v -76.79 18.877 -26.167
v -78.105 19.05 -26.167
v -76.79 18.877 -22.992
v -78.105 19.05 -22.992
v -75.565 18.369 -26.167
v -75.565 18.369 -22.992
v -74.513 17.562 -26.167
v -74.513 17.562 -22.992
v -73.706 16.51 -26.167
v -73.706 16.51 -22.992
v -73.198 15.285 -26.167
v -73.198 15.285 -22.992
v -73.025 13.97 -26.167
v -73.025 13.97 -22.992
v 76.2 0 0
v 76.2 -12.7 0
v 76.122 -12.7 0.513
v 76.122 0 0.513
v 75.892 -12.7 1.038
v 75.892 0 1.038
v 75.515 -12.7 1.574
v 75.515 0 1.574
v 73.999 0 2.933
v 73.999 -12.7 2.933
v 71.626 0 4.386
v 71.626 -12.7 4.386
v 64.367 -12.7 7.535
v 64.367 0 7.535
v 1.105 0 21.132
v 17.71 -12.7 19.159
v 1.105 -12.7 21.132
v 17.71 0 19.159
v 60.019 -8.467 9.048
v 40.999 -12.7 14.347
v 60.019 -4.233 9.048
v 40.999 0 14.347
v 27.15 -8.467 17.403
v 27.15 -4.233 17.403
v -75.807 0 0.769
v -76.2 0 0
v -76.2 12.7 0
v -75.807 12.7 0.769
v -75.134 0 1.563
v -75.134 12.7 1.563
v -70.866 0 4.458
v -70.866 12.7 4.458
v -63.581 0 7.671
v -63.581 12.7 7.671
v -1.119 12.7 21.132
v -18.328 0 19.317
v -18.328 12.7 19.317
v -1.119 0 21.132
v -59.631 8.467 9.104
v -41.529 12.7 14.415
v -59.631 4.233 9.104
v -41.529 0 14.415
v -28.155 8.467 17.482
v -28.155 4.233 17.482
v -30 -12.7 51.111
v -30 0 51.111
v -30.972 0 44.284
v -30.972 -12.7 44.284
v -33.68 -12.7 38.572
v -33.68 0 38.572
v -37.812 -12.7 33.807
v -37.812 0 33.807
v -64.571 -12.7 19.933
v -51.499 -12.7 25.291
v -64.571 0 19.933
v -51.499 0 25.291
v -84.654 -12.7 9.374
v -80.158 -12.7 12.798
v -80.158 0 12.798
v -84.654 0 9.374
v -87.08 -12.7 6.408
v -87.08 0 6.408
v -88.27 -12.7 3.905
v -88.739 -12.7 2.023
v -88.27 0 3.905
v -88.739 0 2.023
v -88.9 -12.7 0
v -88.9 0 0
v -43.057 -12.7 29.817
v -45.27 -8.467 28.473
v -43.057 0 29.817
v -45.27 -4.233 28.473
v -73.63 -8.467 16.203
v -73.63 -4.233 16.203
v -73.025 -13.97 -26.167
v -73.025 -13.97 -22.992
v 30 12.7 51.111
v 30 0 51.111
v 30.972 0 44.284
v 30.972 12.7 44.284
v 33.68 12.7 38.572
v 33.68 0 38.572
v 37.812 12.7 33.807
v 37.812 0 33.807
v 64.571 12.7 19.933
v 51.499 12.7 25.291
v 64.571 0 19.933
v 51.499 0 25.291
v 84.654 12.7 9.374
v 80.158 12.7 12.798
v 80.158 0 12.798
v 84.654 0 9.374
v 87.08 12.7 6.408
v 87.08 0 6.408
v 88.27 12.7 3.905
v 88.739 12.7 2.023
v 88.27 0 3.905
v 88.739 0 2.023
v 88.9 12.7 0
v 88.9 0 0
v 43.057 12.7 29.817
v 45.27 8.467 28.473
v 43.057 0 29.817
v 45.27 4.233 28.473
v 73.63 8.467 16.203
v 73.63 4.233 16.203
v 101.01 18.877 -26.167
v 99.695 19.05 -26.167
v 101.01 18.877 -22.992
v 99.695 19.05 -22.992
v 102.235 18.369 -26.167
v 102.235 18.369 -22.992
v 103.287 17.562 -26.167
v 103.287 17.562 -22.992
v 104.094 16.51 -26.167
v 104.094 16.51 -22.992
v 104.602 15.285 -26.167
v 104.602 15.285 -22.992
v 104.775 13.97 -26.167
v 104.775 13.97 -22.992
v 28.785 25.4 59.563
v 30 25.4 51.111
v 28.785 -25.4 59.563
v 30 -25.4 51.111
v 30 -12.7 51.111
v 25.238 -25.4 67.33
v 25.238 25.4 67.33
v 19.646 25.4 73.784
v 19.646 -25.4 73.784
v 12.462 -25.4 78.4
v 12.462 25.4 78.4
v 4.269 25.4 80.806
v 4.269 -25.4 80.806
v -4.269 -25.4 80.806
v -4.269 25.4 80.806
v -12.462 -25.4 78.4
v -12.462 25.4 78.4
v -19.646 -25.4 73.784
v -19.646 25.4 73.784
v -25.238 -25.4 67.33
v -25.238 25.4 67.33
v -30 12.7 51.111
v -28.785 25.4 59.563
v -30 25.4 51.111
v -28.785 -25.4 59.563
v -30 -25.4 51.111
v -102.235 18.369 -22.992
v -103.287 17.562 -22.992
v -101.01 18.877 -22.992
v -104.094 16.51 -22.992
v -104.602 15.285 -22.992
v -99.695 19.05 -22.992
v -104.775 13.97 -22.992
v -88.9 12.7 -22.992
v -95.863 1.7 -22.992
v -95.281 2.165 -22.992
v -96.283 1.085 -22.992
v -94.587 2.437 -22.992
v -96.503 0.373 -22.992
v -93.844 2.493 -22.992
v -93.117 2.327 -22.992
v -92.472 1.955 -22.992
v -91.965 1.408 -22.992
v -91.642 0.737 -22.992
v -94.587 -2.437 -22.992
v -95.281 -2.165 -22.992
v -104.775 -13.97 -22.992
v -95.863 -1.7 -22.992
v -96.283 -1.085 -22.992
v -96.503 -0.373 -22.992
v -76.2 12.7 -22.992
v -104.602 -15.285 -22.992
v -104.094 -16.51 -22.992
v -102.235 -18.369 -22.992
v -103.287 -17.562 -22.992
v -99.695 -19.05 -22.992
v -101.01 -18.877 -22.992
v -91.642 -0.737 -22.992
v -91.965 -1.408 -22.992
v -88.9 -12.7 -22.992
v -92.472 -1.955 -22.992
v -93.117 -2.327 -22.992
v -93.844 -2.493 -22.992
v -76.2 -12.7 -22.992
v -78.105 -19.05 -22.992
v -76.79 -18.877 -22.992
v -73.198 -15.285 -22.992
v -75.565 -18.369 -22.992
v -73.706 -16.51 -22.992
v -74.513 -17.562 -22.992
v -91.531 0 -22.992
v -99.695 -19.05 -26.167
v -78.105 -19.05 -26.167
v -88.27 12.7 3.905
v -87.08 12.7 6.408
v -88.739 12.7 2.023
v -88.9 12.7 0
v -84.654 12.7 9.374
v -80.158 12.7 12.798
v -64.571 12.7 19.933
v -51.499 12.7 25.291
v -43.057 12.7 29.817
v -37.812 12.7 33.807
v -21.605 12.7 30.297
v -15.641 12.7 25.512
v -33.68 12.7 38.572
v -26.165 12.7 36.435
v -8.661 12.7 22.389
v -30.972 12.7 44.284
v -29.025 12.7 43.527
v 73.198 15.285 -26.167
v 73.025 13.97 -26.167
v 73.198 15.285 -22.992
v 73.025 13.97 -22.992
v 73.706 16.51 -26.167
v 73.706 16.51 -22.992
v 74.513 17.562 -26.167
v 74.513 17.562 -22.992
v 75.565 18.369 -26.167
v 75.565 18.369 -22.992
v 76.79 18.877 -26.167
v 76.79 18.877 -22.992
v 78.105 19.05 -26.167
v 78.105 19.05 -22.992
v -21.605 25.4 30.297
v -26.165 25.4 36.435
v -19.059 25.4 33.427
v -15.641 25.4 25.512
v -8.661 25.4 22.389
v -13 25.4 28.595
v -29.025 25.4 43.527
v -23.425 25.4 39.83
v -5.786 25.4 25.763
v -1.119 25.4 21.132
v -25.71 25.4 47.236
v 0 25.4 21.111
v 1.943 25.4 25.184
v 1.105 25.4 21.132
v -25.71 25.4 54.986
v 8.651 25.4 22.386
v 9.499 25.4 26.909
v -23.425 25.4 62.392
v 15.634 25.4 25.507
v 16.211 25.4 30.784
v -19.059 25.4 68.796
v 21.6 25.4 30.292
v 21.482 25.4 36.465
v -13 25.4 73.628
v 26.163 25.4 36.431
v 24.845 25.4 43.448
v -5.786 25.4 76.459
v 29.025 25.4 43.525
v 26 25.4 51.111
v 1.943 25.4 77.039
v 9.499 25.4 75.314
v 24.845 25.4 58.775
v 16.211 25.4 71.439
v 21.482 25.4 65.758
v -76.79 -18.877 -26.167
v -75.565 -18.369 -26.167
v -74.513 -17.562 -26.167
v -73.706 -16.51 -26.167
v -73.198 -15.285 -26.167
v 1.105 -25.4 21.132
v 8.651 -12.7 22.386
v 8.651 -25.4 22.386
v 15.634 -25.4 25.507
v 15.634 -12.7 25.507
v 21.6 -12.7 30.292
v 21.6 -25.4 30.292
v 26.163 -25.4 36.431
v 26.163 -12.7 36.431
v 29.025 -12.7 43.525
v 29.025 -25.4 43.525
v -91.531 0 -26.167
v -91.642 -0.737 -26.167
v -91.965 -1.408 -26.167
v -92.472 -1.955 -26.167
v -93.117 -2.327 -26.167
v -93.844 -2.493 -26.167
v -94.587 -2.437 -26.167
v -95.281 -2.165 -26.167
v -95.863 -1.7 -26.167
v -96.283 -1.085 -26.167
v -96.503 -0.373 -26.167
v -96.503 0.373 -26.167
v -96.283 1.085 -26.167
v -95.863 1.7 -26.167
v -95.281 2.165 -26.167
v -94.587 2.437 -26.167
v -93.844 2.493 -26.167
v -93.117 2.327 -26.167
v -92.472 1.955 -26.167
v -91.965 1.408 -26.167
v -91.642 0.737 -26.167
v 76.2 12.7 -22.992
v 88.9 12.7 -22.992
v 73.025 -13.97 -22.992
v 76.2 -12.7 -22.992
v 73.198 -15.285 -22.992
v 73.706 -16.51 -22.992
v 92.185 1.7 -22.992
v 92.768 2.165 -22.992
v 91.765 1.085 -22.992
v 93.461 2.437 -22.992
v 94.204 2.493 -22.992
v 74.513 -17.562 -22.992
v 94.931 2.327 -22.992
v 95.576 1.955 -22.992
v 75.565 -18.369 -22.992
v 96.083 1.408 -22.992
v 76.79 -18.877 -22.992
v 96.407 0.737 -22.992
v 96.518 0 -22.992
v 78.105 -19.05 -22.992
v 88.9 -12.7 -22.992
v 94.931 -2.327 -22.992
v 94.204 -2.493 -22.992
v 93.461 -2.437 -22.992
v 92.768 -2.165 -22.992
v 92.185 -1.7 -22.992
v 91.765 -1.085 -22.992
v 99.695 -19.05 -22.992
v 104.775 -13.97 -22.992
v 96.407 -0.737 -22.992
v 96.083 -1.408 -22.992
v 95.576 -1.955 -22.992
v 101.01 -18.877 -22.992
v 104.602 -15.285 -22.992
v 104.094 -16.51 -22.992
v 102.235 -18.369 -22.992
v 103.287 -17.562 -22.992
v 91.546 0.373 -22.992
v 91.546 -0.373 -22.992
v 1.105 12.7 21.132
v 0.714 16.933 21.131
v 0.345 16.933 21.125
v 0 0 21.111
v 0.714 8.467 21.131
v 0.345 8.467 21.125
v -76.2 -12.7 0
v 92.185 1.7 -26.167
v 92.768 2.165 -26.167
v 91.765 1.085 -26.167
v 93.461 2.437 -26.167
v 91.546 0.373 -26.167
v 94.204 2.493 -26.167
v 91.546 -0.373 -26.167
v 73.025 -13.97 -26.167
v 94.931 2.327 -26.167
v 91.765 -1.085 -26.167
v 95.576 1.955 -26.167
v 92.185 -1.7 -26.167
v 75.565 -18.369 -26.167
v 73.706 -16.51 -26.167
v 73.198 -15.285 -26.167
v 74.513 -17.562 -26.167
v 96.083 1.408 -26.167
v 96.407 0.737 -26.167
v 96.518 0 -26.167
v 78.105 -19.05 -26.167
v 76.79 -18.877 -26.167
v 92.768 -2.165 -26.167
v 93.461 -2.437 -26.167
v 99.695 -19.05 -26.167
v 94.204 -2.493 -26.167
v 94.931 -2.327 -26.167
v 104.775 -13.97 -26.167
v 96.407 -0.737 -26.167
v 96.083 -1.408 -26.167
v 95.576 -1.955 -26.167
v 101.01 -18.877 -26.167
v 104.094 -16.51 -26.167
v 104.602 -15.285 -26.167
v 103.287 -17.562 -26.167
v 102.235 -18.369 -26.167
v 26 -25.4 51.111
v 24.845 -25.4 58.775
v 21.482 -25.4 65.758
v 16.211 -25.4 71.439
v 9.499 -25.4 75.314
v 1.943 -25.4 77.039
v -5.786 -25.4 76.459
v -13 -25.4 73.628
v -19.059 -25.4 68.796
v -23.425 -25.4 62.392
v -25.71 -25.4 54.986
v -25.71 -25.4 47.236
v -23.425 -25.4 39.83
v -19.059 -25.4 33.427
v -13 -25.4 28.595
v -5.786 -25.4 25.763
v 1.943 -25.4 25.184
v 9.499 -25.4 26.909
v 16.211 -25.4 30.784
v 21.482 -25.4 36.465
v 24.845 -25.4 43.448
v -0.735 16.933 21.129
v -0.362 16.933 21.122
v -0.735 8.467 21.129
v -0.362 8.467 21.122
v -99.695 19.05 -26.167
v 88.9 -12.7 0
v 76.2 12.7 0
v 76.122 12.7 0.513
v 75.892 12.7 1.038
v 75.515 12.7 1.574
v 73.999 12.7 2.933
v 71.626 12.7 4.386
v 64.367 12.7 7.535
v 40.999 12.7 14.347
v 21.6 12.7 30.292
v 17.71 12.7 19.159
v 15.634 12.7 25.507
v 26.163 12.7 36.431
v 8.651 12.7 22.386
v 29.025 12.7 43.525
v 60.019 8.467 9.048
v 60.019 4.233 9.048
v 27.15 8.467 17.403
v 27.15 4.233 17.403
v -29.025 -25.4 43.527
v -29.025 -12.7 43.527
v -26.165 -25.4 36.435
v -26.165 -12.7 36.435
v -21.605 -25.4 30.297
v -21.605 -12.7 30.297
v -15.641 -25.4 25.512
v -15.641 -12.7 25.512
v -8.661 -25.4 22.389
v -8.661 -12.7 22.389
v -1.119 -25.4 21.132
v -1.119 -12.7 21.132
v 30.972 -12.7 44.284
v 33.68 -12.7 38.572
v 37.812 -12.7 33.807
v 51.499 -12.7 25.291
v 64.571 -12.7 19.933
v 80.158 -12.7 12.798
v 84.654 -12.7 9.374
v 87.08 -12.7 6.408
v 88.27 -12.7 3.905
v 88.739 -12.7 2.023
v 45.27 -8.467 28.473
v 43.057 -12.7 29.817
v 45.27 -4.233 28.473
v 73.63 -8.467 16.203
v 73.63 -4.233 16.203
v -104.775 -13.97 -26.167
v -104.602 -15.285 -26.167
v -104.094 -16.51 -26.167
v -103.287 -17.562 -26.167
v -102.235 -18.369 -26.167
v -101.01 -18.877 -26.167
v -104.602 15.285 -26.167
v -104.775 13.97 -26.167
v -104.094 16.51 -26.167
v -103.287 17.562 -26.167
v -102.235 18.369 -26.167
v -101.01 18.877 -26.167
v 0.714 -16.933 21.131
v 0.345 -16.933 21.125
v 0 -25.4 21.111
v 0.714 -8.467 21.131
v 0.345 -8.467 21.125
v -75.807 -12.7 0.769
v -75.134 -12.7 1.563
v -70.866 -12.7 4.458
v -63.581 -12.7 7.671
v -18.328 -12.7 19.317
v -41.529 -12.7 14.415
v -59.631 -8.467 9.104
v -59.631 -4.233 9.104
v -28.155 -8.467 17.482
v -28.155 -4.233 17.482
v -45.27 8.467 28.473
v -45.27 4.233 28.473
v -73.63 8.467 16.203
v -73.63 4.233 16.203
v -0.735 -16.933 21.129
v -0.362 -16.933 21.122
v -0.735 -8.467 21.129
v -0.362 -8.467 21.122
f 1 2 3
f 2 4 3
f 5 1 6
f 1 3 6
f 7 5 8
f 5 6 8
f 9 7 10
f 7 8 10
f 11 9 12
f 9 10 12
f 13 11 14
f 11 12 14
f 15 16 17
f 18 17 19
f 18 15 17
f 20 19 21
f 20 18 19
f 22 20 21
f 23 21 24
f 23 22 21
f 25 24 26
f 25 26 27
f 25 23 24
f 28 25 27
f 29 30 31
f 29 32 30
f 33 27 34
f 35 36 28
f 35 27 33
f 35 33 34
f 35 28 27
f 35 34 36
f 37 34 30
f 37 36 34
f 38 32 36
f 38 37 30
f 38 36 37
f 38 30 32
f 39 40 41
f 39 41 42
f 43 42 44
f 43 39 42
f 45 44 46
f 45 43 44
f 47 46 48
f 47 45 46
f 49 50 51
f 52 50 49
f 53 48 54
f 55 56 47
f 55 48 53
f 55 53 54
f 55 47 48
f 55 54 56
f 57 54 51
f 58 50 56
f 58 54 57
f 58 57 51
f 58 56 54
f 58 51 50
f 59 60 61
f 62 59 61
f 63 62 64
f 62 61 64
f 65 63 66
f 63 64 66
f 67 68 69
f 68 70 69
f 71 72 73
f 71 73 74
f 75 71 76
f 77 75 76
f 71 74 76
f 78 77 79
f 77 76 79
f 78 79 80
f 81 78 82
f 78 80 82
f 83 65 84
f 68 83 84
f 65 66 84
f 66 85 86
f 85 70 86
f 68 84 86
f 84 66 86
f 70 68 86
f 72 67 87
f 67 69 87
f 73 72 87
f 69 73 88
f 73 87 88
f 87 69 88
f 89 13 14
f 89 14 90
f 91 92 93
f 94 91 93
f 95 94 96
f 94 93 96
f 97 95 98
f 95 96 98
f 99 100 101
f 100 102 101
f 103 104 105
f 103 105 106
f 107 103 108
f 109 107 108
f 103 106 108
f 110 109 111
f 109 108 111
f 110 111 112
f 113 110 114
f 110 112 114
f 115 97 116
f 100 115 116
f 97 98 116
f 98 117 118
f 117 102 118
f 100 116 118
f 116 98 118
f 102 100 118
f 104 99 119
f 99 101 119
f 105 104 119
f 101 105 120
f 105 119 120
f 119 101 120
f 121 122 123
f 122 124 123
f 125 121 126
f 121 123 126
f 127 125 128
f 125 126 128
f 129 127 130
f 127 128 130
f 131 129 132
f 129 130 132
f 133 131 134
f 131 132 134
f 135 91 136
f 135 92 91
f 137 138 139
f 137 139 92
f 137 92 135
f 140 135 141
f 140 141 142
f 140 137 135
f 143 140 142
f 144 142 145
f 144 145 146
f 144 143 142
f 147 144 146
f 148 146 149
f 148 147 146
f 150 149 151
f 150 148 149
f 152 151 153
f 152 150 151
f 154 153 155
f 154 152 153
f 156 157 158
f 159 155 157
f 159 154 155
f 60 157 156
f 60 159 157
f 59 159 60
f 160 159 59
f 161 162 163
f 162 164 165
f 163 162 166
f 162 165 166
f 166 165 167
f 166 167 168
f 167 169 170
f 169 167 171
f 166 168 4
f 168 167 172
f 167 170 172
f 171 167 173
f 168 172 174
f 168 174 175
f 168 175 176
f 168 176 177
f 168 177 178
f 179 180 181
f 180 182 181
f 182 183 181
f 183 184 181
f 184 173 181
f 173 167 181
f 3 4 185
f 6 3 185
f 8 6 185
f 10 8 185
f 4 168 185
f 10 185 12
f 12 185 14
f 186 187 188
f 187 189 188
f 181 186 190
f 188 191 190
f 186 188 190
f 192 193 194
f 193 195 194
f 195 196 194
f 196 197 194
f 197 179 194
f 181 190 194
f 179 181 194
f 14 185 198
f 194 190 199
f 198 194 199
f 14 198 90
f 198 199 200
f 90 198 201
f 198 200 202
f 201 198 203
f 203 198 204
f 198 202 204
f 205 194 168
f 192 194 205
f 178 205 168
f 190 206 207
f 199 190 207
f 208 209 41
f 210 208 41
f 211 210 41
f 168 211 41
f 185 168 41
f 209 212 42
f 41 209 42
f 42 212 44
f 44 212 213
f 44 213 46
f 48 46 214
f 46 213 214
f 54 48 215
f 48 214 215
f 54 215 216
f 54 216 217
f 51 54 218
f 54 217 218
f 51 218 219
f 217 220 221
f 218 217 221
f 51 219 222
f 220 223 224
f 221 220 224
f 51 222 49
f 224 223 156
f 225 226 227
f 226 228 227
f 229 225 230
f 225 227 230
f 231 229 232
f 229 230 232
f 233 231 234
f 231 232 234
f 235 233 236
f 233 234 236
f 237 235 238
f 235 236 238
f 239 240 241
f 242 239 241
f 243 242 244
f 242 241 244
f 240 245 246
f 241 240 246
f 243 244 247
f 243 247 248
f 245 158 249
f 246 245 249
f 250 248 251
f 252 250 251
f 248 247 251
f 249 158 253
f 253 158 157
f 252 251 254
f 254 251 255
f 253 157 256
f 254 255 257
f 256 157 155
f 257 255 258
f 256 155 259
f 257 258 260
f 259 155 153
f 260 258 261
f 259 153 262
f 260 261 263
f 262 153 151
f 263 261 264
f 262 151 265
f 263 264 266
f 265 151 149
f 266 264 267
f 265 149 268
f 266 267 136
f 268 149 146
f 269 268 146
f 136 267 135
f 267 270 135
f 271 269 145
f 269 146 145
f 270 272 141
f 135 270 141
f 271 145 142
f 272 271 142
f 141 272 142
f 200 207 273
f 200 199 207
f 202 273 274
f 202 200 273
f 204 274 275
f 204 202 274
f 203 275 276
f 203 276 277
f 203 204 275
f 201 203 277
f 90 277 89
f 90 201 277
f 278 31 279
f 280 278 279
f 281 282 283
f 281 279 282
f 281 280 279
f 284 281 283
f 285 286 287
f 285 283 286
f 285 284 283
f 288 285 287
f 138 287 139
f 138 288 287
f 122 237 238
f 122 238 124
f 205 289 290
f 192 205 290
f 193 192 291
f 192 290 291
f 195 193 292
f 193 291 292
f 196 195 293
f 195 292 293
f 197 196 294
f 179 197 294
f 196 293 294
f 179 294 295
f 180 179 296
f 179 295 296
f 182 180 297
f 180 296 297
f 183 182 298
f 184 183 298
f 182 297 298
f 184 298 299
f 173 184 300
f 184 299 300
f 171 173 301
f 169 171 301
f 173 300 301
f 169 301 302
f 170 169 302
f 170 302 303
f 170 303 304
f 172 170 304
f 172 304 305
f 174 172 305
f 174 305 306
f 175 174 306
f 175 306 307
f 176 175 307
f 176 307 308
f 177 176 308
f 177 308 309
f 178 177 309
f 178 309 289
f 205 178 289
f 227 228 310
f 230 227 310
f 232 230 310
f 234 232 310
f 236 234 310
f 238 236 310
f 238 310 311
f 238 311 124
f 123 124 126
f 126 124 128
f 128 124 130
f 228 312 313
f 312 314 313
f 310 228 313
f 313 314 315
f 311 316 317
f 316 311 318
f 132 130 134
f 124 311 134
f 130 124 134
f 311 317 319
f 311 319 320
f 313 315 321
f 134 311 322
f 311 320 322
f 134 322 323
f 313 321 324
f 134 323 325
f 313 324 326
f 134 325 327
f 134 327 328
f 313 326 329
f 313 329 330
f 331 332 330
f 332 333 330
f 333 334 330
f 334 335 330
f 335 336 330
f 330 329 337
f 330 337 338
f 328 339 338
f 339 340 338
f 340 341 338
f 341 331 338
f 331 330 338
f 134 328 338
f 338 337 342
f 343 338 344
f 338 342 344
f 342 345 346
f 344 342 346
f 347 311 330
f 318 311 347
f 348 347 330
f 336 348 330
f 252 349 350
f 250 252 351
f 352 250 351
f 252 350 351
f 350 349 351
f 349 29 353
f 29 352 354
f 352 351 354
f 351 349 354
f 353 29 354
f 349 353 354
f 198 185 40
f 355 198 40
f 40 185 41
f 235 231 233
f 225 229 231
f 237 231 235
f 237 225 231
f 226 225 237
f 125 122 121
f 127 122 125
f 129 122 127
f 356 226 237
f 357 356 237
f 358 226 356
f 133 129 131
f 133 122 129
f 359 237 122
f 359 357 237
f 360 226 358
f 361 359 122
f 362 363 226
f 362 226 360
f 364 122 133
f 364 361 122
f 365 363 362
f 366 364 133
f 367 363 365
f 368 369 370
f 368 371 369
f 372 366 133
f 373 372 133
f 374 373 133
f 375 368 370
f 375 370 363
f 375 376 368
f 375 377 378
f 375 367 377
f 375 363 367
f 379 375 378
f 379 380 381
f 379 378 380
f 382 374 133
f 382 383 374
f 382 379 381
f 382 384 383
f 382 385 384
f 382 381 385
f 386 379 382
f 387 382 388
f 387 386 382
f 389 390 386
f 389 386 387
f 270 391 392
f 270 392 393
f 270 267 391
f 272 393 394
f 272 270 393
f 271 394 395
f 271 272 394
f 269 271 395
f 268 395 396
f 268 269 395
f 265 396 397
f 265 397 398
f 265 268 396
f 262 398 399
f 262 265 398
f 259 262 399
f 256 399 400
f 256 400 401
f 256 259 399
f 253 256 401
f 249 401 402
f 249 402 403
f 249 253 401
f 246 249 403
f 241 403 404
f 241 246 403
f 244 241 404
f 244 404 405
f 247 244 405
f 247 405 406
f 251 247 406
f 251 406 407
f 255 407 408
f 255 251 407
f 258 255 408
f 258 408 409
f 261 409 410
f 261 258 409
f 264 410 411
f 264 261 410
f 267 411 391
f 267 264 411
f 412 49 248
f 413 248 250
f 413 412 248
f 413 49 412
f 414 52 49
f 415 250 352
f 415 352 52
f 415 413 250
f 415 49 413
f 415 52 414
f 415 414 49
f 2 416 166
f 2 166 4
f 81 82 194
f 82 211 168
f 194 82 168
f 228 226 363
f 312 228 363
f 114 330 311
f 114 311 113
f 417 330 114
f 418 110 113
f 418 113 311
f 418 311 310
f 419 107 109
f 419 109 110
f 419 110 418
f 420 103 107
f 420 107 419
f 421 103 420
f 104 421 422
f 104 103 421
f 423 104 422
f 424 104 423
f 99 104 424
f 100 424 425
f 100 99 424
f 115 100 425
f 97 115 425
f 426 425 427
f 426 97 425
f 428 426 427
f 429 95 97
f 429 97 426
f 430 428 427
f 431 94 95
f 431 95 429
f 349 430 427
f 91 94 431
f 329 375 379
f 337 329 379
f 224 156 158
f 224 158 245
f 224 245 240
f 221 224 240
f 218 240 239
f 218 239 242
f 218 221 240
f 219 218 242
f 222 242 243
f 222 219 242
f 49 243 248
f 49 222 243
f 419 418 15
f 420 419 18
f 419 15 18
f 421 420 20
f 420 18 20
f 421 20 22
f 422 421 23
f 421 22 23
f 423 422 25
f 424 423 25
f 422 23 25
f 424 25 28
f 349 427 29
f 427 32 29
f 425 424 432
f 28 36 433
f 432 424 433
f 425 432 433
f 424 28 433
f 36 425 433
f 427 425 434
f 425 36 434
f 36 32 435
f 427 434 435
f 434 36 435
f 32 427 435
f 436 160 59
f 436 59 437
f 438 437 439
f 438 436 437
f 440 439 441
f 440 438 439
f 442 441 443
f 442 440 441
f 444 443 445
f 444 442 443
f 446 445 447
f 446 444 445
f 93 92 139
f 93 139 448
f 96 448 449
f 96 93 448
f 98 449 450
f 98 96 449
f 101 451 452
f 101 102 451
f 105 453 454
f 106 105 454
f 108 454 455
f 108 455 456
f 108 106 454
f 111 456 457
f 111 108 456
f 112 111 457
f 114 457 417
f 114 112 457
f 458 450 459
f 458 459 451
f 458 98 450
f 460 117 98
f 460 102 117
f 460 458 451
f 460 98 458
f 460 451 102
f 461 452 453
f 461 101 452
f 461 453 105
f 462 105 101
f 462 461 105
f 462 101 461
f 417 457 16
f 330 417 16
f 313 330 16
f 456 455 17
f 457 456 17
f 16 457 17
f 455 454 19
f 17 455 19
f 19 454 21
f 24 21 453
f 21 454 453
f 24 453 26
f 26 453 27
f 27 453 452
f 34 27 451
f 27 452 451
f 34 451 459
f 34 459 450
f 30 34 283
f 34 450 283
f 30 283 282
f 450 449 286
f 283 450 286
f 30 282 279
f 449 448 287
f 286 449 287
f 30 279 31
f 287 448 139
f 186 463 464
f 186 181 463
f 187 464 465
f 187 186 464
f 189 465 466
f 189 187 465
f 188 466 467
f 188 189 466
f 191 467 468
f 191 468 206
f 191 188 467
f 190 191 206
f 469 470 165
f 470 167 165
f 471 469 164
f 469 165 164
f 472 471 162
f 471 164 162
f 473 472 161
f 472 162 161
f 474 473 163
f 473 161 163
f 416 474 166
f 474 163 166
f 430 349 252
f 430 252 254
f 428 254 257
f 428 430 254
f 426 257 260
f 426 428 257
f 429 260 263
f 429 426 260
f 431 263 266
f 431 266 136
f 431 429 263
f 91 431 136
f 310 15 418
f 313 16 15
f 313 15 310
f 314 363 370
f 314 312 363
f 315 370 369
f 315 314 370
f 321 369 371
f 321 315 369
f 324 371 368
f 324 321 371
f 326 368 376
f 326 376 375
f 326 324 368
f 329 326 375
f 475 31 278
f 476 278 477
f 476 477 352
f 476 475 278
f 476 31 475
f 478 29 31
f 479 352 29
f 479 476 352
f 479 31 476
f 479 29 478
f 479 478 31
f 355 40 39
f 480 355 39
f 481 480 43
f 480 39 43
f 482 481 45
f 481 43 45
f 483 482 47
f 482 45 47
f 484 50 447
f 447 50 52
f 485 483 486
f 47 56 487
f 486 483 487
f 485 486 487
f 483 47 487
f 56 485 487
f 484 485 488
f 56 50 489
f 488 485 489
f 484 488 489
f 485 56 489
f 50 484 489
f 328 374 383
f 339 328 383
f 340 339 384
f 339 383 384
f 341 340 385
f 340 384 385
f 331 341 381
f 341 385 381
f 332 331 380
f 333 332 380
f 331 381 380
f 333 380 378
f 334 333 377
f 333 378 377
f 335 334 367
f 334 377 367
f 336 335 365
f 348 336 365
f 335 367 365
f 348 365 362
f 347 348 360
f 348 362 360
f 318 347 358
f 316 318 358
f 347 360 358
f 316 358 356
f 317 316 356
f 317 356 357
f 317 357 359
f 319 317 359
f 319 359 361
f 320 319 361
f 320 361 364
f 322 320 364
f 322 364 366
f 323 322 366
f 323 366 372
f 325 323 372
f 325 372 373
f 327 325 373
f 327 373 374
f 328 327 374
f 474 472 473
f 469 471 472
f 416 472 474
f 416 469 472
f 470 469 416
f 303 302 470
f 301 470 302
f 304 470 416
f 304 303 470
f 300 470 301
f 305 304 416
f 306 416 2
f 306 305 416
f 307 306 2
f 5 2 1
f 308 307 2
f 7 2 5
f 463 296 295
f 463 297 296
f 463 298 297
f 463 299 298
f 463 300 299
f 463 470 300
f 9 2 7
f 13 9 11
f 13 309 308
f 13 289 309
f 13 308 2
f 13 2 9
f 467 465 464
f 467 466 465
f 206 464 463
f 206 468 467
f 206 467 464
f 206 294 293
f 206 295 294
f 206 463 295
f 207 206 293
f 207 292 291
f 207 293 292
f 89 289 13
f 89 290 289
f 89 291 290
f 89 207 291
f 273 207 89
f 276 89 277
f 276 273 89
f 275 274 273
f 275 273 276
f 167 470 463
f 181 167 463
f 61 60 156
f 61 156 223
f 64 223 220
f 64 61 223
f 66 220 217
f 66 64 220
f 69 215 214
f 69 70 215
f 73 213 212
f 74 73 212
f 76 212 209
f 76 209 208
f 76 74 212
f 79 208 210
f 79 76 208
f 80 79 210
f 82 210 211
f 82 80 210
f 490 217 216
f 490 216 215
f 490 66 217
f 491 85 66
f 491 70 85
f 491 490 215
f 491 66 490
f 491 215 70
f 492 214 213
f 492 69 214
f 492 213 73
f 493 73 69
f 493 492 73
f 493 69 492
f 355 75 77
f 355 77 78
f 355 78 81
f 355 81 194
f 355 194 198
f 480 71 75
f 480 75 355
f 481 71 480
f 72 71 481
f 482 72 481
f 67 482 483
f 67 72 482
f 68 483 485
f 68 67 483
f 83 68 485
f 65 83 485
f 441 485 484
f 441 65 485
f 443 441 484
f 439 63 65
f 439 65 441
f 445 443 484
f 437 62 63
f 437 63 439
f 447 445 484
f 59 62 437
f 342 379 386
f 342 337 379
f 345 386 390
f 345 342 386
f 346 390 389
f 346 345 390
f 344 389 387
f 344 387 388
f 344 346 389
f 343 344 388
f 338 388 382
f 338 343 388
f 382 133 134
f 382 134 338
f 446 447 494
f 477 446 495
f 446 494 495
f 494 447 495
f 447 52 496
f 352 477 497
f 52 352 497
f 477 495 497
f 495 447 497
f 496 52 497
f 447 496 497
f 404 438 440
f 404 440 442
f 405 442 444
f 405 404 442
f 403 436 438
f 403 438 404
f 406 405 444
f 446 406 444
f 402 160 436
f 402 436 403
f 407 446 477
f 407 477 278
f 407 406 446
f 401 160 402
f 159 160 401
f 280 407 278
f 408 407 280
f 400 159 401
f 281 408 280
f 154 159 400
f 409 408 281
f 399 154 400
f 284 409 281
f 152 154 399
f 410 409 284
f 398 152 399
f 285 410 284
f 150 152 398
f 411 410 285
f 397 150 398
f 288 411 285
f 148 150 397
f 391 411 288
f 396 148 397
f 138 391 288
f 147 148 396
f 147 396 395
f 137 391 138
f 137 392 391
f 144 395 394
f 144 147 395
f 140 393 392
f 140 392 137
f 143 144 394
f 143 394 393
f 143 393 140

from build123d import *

# Parameters (mm, degrees)
F0_R     = 26
F1_DEPTH = 25.4
F2_DEPTH = 12.7
F3_W     = 31.75
F3_H     = 38.1
F4_DEPTH = 3.175
F5_R     = 5.08
F6_R     = 5.08
F7_R     = 2.5
F8_DEPTH = 25.4


with BuildPart() as f1:
    # F0 (on Front) → F1 (new body, symmetric)
    with BuildSketch(Plane.XZ):
        with BuildLine():
            ThreePointArc((1.10512, 21.131636), (21.600389, 30.292455), (30, 51.111274))
            ThreePointArc((30, 51.111274), (0, 81.111274), (-30, 51.111274))
            ThreePointArc((-30, 51.111274), (-21.605128, 30.297373), (-1.11877, 21.132142))
            add(Edge.make_bspline(
                [(-1.11877, 21.132142), (-0.729546, 21.131124), (-0.356346, 21.124225), (0, 21.111274)],
                knots=[77.429523, 77.429523, 77.429523, 77.429523, 79.070386, 79.070386, 79.070386, 79.070386], degree=3))
            add(Edge.make_bspline(
                [(1.10512, 21.131636), (0.702299, 21.134485), (0.333214, 21.127816), (0, 21.111274)],
                knots=[76.974546, 76.974546, 76.974546, 76.974546, 79.070386, 79.070386, 79.070386, 79.070386], degree=3))
        make_face()
        with Locations((0, 51.111274)):
            Circle(F0_R, mode=Mode.SUBTRACT)
    extrude(amount=F1_DEPTH, both=True)

    # F0 (on Front) → F2 (join, symmetric)
    with BuildSketch(Plane.XZ):
        with BuildLine():
            ThreePointArc((-1.11877, 21.132142), (-21.605128, 30.297373), (-30, 51.111274))
            add(Edge.make_bspline(
                [(-30, 51.111274), (-30, 18.52078), (-88.9, 22.936654), (-88.9, 0)],
                knots=[0, 0, 0, 0, 77.984436, 77.984436, 77.984436, 77.984436], degree=3))
            Line((-88.9, 0), (-88.9, -26.166598))
            Line((-88.9, -26.166598), (-76.2, -26.166598))
            Line((-76.2, -26.166598), (-76.2, 0))
            add(Edge.make_bspline(
                [(-76.2, 0), (-73.534535, 8.132415), (-19.485583, 21.180166), (-1.11877, 21.132142)],
                knots=[0, 0, 0, 0, 77.429523, 77.429523, 77.429523, 77.429523], degree=3))
        make_face()
        with BuildLine():
            add(Edge.make_bspline(
                [(30, 51.111274), (30, 18.52078), (88.9, 22.936654), (88.9, 0)],
                knots=[0, 0, 0, 0, 77.984436, 77.984436, 77.984436, 77.984436], degree=3))
            ThreePointArc((30, 51.111274), (21.600389, 30.292455), (1.10512, 21.131636))
            add(Edge.make_bspline(
                [(76.2, 0), (76.2, 8.084629), (15.899645, 21.026998), (1.10512, 21.131636)],
                knots=[0, 0, 0, 0, 76.974546, 76.974546, 76.974546, 76.974546], degree=3))
            Line((76.2, 0), (76.2, -26.166598))
            Line((76.2, -26.166598), (88.9, -26.166598))
            Line((88.9, -26.166598), (88.9, 0))
        make_face()
    extrude(amount=F2_DEPTH, both=True)

    # F3 (on face) → F4 (join)
    with BuildSketch(Plane(origin=(0, 0, -26.166598), x_dir=(1, 0, 0), z_dir=(0, 0, -1))):
        with Locations((-88.9, 0)):
            Rectangle(F3_W, F3_H)
        with Locations((88.9, 0)):
            Rectangle(F3_W, F3_H)
    extrude(amount=-F4_DEPTH)

    # F5
    f5_edges = [f1.edges().sort_by_distance(p)[0] for p in [
        (-104.775, -19.05, -24.579098),
        (-73.025, -19.05, -24.579098),
        (-104.775, 19.05, -24.579098),
        (-73.025, 19.05, -24.579098),
    ]]
    fillet(f5_edges, radius=F5_R)

    # F6
    f6_edges = [f1.edges().sort_by_distance(p)[0] for p in [
        (104.775, -19.05, -24.579098),
        (73.025, -19.05, -24.579098),
        (104.775, 19.05, -24.579098),
        (73.025, 19.05, -24.579098),
    ]]
    fillet(f6_edges, radius=F6_R)

    # F7 (on face) → F8 (cut)
    with BuildSketch(Plane(origin=(0, 0, -26.166598), x_dir=(1, 0, 0), z_dir=(0, 0, -1))):
        with Locations((-94.0308, 0)):
            Circle(F7_R)
        with Locations((94.017617, 0)):
            Circle(F7_R)
    extrude(amount=-F8_DEPTH, mode=Mode.SUBTRACT)


solid = f1.part
